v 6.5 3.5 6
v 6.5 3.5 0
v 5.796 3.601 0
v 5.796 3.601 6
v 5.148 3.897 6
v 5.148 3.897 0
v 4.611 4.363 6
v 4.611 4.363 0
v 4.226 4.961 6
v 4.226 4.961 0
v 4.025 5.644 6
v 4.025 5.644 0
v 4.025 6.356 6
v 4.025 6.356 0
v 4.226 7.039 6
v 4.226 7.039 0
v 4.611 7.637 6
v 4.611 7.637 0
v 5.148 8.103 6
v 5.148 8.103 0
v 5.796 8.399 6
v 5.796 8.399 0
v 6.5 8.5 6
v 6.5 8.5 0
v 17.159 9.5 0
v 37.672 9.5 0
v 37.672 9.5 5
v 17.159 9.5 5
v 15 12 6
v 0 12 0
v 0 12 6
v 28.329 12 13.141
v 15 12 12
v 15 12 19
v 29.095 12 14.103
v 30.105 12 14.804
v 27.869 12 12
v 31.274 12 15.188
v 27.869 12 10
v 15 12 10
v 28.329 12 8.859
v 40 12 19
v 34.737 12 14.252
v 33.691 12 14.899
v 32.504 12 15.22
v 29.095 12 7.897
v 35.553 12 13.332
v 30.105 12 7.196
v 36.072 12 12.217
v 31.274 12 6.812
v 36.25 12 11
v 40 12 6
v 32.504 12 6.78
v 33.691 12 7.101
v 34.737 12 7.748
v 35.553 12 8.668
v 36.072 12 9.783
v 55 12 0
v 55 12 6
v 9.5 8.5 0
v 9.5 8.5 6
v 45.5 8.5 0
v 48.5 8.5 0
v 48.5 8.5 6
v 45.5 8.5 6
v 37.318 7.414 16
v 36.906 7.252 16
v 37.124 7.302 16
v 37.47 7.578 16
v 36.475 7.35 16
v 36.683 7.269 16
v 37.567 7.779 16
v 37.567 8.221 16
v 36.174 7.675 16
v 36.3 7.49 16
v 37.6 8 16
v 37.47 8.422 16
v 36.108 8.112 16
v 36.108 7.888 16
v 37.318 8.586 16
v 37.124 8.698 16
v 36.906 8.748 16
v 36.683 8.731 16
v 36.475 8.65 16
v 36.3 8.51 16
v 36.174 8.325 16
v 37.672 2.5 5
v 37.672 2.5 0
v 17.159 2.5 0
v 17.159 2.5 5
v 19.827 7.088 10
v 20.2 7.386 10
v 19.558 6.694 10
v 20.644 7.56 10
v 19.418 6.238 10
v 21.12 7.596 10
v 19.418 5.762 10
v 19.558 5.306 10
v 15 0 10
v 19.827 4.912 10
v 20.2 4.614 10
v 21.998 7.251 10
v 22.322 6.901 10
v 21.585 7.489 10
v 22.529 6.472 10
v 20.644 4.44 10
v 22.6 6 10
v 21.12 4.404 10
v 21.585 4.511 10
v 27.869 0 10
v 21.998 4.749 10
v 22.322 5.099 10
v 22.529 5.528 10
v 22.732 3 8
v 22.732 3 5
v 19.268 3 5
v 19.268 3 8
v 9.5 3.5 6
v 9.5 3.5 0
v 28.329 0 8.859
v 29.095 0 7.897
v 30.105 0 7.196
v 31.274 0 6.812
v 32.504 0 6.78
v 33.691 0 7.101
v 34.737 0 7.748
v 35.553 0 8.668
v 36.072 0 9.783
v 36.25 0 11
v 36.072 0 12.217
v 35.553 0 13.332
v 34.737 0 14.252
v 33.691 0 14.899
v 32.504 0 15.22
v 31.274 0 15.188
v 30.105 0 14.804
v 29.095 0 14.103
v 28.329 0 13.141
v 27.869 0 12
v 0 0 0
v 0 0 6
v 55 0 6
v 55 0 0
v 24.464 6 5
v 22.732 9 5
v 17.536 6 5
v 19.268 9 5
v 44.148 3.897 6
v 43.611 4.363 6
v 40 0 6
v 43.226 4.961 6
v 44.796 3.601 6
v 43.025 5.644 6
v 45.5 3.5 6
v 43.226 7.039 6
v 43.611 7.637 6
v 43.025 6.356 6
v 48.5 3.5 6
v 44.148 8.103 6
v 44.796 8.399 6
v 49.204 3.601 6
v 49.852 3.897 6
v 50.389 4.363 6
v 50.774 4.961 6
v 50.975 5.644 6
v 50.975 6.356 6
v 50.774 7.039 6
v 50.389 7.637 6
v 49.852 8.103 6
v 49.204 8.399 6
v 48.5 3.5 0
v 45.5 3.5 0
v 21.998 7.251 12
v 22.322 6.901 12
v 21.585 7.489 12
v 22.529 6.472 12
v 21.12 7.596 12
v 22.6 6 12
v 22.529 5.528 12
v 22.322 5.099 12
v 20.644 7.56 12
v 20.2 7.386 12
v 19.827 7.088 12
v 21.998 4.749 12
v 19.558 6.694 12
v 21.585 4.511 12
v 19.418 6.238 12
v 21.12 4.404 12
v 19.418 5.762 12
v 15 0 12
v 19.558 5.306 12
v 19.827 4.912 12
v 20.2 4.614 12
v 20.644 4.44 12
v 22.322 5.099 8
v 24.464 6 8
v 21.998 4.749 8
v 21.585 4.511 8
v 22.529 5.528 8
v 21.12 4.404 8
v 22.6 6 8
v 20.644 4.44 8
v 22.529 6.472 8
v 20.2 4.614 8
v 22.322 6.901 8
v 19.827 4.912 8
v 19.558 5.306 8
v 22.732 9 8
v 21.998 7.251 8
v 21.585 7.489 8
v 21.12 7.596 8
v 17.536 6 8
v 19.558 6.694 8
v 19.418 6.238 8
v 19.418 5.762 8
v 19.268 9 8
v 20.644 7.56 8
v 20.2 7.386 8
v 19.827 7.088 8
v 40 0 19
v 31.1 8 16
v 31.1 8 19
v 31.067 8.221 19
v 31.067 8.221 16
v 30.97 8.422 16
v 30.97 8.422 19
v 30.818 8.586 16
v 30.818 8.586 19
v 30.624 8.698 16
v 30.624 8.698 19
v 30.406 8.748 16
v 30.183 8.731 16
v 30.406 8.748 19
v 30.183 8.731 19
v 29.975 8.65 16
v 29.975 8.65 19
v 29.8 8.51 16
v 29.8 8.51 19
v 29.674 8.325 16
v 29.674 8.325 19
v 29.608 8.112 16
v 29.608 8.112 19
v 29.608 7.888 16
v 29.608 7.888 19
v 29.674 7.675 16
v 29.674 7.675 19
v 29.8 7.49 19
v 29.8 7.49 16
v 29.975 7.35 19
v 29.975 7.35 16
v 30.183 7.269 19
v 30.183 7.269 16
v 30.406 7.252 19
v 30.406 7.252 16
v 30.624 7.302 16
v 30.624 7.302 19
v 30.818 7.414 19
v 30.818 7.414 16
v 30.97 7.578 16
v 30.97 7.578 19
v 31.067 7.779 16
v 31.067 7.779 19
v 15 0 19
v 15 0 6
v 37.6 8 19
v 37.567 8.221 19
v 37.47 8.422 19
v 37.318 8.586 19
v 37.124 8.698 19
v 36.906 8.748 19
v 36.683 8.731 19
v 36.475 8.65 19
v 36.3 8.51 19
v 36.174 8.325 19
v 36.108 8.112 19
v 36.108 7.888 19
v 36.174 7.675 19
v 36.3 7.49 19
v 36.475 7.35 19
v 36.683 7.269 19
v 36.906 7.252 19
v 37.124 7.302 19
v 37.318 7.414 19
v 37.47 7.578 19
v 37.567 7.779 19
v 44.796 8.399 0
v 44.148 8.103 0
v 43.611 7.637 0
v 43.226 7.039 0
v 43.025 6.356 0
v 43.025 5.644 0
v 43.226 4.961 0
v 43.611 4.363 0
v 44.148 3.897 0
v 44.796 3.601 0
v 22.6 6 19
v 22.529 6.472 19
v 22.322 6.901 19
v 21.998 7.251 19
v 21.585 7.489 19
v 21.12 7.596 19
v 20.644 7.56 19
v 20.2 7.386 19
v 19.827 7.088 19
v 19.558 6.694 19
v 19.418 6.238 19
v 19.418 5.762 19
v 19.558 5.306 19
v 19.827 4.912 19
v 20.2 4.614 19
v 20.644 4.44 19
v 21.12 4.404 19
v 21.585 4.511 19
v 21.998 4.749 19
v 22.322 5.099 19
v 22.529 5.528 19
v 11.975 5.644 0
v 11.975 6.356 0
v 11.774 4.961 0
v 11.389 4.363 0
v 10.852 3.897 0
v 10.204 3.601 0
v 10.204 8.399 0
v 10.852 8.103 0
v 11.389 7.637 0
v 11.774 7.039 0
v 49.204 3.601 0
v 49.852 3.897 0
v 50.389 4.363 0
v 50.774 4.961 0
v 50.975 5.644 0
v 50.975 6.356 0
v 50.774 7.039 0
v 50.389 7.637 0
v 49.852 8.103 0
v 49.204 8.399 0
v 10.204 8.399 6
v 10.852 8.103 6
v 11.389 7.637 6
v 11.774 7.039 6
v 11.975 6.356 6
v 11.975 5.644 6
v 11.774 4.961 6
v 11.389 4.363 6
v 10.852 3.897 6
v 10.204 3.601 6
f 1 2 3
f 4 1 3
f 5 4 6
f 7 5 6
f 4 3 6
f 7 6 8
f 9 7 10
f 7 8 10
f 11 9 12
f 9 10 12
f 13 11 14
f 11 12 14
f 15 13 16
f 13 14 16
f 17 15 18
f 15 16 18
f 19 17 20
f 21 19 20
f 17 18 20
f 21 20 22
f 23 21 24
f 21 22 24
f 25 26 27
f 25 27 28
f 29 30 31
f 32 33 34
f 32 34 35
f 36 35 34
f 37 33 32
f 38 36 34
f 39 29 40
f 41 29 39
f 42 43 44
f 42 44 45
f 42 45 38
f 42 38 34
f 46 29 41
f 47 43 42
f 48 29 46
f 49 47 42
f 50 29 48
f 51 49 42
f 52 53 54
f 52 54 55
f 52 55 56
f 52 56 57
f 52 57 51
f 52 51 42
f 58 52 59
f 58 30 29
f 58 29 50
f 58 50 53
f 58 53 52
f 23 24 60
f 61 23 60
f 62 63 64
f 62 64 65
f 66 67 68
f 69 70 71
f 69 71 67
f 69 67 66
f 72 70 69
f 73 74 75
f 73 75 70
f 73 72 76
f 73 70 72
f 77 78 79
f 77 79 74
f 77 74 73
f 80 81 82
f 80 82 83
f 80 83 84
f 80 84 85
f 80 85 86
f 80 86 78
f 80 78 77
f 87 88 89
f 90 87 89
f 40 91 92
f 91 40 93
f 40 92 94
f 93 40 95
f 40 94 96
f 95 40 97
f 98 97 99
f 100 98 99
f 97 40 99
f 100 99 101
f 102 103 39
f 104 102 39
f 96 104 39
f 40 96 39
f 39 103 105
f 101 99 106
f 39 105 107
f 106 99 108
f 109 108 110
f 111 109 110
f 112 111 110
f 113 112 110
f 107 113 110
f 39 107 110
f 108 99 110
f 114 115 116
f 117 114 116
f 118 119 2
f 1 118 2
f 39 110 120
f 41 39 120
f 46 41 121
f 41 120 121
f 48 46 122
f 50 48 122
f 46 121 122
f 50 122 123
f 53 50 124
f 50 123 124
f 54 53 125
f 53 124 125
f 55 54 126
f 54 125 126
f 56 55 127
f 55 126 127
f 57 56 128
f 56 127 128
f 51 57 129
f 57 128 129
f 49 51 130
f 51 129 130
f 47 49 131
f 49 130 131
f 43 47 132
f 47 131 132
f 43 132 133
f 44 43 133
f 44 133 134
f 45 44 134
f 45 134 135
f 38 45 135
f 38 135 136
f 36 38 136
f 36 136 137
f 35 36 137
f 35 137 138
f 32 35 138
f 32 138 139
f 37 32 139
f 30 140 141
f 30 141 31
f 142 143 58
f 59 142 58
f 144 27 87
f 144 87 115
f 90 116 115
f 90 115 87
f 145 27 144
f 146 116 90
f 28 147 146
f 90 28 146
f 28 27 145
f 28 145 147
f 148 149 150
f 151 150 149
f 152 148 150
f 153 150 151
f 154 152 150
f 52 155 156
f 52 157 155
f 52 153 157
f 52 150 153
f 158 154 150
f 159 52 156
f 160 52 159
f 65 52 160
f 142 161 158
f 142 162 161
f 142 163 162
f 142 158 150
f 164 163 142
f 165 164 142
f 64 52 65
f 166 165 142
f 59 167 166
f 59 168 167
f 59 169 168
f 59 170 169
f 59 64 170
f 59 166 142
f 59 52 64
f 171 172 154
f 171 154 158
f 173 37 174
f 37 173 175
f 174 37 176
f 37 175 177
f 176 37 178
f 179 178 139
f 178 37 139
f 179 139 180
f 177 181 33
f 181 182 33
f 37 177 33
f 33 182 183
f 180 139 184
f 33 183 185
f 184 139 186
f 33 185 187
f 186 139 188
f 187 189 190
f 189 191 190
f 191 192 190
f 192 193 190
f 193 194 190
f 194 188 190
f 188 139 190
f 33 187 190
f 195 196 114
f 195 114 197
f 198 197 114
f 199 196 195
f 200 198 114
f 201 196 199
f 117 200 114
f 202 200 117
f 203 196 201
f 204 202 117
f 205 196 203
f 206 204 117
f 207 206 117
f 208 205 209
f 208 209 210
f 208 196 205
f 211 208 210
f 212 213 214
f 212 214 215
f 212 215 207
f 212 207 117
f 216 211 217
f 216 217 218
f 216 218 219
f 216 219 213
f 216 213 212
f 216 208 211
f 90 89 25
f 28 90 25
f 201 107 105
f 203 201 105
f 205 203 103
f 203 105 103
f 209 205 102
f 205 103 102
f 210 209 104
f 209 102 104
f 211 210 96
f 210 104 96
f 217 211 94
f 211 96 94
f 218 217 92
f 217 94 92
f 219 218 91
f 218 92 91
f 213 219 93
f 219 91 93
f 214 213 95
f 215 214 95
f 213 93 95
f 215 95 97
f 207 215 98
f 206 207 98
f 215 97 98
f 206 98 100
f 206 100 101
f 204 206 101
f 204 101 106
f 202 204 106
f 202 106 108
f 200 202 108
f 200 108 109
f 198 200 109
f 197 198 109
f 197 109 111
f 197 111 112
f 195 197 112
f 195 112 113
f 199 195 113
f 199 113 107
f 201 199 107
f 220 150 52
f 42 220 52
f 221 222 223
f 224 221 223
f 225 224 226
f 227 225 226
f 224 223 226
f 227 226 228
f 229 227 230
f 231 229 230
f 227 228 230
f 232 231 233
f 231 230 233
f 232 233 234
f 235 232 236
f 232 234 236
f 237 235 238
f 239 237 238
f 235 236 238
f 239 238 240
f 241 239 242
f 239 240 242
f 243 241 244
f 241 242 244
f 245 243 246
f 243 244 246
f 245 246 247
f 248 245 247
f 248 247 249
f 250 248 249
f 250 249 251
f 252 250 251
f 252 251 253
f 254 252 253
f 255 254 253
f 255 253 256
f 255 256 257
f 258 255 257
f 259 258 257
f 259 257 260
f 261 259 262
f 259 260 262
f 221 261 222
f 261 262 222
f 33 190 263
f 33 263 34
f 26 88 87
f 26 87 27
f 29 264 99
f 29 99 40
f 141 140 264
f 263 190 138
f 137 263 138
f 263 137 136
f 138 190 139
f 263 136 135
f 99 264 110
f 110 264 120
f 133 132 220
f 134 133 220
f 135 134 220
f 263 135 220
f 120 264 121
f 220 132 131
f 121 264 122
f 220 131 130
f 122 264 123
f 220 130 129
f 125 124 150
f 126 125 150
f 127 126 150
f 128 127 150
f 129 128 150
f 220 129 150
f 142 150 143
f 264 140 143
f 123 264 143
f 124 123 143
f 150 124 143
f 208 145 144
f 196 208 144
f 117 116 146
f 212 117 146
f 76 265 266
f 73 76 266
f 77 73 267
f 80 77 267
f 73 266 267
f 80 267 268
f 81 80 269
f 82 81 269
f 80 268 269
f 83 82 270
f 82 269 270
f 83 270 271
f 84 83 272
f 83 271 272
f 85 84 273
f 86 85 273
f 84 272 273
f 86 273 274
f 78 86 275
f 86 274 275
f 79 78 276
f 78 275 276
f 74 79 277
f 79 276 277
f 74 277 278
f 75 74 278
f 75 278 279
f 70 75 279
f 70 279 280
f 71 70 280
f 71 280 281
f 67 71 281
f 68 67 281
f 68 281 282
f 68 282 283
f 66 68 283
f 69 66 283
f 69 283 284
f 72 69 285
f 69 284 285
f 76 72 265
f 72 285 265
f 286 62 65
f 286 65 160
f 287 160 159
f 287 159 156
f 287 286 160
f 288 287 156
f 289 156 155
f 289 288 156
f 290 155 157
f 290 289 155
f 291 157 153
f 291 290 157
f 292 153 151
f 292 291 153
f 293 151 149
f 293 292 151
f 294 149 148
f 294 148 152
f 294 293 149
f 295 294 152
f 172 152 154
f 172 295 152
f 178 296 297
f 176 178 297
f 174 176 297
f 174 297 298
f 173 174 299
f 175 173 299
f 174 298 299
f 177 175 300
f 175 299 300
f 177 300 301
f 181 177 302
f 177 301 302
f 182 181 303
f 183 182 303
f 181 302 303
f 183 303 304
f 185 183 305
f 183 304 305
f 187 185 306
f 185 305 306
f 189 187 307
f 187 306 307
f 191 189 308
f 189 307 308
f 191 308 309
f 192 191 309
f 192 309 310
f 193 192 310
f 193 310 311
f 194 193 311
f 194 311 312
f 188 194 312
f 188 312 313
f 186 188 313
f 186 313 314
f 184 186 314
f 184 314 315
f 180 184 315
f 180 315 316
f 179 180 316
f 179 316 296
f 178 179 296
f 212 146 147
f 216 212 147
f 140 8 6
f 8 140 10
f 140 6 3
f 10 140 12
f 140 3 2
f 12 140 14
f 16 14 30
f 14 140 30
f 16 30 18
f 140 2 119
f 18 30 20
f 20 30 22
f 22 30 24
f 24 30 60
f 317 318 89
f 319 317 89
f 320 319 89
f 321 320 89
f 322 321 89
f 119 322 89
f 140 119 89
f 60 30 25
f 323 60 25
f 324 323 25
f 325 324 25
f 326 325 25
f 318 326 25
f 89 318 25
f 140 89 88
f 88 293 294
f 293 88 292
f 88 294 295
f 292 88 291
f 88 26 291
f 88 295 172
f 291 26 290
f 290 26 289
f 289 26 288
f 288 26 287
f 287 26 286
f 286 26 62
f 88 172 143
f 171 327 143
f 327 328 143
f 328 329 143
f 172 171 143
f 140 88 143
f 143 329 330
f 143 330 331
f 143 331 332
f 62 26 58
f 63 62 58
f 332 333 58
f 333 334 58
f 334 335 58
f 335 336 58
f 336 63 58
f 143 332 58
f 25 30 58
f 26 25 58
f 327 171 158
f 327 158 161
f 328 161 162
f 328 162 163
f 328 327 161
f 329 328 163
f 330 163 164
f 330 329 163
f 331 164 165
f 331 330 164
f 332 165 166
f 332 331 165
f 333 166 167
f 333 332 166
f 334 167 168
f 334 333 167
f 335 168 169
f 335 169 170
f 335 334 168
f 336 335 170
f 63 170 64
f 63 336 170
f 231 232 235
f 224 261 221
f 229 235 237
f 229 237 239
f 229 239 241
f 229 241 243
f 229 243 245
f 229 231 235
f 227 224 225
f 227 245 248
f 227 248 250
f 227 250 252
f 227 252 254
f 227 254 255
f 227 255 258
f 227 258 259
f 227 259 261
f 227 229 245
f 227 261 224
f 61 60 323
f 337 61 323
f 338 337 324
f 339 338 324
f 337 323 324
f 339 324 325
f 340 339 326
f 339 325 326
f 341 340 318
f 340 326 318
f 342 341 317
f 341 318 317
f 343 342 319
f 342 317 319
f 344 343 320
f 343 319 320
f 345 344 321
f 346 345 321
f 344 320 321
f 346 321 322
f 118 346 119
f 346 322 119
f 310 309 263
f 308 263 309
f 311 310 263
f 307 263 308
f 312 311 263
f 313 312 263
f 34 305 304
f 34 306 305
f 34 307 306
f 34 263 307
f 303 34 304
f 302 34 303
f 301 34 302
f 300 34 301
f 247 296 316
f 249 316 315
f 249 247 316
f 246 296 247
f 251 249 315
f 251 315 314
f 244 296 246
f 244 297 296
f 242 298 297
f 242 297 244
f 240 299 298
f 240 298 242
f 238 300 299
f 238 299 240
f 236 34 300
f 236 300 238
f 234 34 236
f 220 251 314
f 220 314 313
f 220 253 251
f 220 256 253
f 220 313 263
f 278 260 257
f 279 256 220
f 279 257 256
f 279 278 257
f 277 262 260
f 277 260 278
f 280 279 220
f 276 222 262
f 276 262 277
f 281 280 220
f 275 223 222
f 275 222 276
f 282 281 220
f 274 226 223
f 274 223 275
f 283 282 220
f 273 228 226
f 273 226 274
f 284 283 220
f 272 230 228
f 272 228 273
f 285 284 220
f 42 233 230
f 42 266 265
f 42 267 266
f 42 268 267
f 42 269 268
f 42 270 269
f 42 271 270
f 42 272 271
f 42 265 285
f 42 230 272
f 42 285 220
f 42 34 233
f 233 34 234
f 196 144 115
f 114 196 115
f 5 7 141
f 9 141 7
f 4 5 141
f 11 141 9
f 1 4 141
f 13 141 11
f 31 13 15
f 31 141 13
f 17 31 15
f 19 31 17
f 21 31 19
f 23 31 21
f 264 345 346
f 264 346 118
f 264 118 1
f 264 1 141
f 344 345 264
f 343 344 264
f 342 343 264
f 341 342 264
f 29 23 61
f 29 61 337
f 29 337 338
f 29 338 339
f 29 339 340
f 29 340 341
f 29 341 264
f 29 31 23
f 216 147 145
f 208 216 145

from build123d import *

# Parameters (mm, degrees)
SKETCH2_W           = 55
SKETCH2_H           = 12
BOSS_EXTRUDE1_DEPTH = 6
SKETCH3_W           = 25
SKETCH3_H           = 12
BOSS_EXTRUDE2_DEPTH = 13
SKETCH4_R           = 4.25
CUT_EXTRUDE2_DEPTH  = 30
SKETCH5_W           = 20.513890507
SKETCH5_H           = 7
CUT_EXTRUDE3_DEPTH  = 5
SKETCH6_R           = 1.6
CUT_EXTRUDE4_DEPTH  = 11
CUT_EXTRUDE5_DEPTH  = 3
SKETCH8_R           = 0.75
CUT_EXTRUDE6_DEPTH  = 3


with BuildPart() as part:
    # Sketch2 → Boss-Extrude1 (new body)
    with BuildSketch(Plane.XY):
        with Locations((27.5, 6)):
            Rectangle(SKETCH2_W, SKETCH2_H)
        with BuildLine():
            Line((6.5, 8.5), (9.5, 8.5))
            ThreePointArc((9.5, 8.5), (12, 6), (9.5, 3.5))
            Line((9.5, 3.5), (6.5, 3.5))
            ThreePointArc((6.5, 3.5), (4, 6), (6.5, 8.5))
        make_face(mode=Mode.SUBTRACT)
        with BuildLine():
            Line((48.5, 8.5), (45.5, 8.5))
            ThreePointArc((45.5, 8.5), (43, 6), (45.5, 3.5))
            Line((45.5, 3.5), (48.5, 3.5))
            ThreePointArc((48.5, 3.5), (51, 6), (48.5, 8.5))
        make_face(mode=Mode.SUBTRACT)
    extrude(amount=BOSS_EXTRUDE1_DEPTH)

    # Sketch3 → Boss-Extrude2 (add)
    with BuildSketch(Plane.XY.offset(6)):
        with Locations((27.5, 6)):
            Rectangle(SKETCH3_W, SKETCH3_H)
    extrude(amount=BOSS_EXTRUDE2_DEPTH)

    # Sketch4 → Cut-Extrude2 (cut)
    with BuildSketch(Plane.XZ):
        with BuildLine():
            ThreePointArc((27.86932209, 10), (27.75, 11), (27.86932209, 12))
            Line((27.86932209, 12), (15, 12))
            Line((15, 12), (15, 10))
            Line((15, 10), (27.86932209, 10))
        make_face()
        with Locations((32, 11)):
            Circle(SKETCH4_R)
    extrude(amount=-CUT_EXTRUDE2_DEPTH, mode=Mode.SUBTRACT)

    # Sketch5 → Cut-Extrude3 (cut)
    with BuildSketch(Plane(origin=(0, 0, 0), x_dir=(-1, 0, 0), z_dir=(0, 0, -1))):
        with Locations((-27.415473723, 6)):
            Rectangle(SKETCH5_W, SKETCH5_H)
    extrude(amount=-CUT_EXTRUDE3_DEPTH, mode=Mode.SUBTRACT)

    # Sketch6 → Cut-Extrude4 (cut)
    with BuildSketch(Plane.XY.offset(19)):
        with Locations((21, 6)):
            Circle(SKETCH6_R)
    extrude(amount=-CUT_EXTRUDE4_DEPTH, mode=Mode.SUBTRACT)

    # Sketch7 → Cut-Extrude5 (cut)
    with BuildSketch(Plane(origin=(0, 0, 5), x_dir=(-1, 0, 0), z_dir=(0, 0, -1))):
        Polygon((-17.535898385, 6), (-19.267949192, 9), (-22.732050808, 9), (-24.464101615, 6), (-22.732050808, 3), (-19.267949192, 3), align=None)
    extrude(amount=-CUT_EXTRUDE5_DEPTH, mode=Mode.SUBTRACT)

    # Sketch8 → Cut-Extrude6 (cut)
    with BuildSketch(Plane.XY.offset(19)):
        with Locations((36.85, 8)):
            Circle(SKETCH8_R)
        with Locations((30.35, 8)):
            Circle(SKETCH8_R)
    extrude(amount=-CUT_EXTRUDE6_DEPTH, mode=Mode.SUBTRACT)


solid = part.part
